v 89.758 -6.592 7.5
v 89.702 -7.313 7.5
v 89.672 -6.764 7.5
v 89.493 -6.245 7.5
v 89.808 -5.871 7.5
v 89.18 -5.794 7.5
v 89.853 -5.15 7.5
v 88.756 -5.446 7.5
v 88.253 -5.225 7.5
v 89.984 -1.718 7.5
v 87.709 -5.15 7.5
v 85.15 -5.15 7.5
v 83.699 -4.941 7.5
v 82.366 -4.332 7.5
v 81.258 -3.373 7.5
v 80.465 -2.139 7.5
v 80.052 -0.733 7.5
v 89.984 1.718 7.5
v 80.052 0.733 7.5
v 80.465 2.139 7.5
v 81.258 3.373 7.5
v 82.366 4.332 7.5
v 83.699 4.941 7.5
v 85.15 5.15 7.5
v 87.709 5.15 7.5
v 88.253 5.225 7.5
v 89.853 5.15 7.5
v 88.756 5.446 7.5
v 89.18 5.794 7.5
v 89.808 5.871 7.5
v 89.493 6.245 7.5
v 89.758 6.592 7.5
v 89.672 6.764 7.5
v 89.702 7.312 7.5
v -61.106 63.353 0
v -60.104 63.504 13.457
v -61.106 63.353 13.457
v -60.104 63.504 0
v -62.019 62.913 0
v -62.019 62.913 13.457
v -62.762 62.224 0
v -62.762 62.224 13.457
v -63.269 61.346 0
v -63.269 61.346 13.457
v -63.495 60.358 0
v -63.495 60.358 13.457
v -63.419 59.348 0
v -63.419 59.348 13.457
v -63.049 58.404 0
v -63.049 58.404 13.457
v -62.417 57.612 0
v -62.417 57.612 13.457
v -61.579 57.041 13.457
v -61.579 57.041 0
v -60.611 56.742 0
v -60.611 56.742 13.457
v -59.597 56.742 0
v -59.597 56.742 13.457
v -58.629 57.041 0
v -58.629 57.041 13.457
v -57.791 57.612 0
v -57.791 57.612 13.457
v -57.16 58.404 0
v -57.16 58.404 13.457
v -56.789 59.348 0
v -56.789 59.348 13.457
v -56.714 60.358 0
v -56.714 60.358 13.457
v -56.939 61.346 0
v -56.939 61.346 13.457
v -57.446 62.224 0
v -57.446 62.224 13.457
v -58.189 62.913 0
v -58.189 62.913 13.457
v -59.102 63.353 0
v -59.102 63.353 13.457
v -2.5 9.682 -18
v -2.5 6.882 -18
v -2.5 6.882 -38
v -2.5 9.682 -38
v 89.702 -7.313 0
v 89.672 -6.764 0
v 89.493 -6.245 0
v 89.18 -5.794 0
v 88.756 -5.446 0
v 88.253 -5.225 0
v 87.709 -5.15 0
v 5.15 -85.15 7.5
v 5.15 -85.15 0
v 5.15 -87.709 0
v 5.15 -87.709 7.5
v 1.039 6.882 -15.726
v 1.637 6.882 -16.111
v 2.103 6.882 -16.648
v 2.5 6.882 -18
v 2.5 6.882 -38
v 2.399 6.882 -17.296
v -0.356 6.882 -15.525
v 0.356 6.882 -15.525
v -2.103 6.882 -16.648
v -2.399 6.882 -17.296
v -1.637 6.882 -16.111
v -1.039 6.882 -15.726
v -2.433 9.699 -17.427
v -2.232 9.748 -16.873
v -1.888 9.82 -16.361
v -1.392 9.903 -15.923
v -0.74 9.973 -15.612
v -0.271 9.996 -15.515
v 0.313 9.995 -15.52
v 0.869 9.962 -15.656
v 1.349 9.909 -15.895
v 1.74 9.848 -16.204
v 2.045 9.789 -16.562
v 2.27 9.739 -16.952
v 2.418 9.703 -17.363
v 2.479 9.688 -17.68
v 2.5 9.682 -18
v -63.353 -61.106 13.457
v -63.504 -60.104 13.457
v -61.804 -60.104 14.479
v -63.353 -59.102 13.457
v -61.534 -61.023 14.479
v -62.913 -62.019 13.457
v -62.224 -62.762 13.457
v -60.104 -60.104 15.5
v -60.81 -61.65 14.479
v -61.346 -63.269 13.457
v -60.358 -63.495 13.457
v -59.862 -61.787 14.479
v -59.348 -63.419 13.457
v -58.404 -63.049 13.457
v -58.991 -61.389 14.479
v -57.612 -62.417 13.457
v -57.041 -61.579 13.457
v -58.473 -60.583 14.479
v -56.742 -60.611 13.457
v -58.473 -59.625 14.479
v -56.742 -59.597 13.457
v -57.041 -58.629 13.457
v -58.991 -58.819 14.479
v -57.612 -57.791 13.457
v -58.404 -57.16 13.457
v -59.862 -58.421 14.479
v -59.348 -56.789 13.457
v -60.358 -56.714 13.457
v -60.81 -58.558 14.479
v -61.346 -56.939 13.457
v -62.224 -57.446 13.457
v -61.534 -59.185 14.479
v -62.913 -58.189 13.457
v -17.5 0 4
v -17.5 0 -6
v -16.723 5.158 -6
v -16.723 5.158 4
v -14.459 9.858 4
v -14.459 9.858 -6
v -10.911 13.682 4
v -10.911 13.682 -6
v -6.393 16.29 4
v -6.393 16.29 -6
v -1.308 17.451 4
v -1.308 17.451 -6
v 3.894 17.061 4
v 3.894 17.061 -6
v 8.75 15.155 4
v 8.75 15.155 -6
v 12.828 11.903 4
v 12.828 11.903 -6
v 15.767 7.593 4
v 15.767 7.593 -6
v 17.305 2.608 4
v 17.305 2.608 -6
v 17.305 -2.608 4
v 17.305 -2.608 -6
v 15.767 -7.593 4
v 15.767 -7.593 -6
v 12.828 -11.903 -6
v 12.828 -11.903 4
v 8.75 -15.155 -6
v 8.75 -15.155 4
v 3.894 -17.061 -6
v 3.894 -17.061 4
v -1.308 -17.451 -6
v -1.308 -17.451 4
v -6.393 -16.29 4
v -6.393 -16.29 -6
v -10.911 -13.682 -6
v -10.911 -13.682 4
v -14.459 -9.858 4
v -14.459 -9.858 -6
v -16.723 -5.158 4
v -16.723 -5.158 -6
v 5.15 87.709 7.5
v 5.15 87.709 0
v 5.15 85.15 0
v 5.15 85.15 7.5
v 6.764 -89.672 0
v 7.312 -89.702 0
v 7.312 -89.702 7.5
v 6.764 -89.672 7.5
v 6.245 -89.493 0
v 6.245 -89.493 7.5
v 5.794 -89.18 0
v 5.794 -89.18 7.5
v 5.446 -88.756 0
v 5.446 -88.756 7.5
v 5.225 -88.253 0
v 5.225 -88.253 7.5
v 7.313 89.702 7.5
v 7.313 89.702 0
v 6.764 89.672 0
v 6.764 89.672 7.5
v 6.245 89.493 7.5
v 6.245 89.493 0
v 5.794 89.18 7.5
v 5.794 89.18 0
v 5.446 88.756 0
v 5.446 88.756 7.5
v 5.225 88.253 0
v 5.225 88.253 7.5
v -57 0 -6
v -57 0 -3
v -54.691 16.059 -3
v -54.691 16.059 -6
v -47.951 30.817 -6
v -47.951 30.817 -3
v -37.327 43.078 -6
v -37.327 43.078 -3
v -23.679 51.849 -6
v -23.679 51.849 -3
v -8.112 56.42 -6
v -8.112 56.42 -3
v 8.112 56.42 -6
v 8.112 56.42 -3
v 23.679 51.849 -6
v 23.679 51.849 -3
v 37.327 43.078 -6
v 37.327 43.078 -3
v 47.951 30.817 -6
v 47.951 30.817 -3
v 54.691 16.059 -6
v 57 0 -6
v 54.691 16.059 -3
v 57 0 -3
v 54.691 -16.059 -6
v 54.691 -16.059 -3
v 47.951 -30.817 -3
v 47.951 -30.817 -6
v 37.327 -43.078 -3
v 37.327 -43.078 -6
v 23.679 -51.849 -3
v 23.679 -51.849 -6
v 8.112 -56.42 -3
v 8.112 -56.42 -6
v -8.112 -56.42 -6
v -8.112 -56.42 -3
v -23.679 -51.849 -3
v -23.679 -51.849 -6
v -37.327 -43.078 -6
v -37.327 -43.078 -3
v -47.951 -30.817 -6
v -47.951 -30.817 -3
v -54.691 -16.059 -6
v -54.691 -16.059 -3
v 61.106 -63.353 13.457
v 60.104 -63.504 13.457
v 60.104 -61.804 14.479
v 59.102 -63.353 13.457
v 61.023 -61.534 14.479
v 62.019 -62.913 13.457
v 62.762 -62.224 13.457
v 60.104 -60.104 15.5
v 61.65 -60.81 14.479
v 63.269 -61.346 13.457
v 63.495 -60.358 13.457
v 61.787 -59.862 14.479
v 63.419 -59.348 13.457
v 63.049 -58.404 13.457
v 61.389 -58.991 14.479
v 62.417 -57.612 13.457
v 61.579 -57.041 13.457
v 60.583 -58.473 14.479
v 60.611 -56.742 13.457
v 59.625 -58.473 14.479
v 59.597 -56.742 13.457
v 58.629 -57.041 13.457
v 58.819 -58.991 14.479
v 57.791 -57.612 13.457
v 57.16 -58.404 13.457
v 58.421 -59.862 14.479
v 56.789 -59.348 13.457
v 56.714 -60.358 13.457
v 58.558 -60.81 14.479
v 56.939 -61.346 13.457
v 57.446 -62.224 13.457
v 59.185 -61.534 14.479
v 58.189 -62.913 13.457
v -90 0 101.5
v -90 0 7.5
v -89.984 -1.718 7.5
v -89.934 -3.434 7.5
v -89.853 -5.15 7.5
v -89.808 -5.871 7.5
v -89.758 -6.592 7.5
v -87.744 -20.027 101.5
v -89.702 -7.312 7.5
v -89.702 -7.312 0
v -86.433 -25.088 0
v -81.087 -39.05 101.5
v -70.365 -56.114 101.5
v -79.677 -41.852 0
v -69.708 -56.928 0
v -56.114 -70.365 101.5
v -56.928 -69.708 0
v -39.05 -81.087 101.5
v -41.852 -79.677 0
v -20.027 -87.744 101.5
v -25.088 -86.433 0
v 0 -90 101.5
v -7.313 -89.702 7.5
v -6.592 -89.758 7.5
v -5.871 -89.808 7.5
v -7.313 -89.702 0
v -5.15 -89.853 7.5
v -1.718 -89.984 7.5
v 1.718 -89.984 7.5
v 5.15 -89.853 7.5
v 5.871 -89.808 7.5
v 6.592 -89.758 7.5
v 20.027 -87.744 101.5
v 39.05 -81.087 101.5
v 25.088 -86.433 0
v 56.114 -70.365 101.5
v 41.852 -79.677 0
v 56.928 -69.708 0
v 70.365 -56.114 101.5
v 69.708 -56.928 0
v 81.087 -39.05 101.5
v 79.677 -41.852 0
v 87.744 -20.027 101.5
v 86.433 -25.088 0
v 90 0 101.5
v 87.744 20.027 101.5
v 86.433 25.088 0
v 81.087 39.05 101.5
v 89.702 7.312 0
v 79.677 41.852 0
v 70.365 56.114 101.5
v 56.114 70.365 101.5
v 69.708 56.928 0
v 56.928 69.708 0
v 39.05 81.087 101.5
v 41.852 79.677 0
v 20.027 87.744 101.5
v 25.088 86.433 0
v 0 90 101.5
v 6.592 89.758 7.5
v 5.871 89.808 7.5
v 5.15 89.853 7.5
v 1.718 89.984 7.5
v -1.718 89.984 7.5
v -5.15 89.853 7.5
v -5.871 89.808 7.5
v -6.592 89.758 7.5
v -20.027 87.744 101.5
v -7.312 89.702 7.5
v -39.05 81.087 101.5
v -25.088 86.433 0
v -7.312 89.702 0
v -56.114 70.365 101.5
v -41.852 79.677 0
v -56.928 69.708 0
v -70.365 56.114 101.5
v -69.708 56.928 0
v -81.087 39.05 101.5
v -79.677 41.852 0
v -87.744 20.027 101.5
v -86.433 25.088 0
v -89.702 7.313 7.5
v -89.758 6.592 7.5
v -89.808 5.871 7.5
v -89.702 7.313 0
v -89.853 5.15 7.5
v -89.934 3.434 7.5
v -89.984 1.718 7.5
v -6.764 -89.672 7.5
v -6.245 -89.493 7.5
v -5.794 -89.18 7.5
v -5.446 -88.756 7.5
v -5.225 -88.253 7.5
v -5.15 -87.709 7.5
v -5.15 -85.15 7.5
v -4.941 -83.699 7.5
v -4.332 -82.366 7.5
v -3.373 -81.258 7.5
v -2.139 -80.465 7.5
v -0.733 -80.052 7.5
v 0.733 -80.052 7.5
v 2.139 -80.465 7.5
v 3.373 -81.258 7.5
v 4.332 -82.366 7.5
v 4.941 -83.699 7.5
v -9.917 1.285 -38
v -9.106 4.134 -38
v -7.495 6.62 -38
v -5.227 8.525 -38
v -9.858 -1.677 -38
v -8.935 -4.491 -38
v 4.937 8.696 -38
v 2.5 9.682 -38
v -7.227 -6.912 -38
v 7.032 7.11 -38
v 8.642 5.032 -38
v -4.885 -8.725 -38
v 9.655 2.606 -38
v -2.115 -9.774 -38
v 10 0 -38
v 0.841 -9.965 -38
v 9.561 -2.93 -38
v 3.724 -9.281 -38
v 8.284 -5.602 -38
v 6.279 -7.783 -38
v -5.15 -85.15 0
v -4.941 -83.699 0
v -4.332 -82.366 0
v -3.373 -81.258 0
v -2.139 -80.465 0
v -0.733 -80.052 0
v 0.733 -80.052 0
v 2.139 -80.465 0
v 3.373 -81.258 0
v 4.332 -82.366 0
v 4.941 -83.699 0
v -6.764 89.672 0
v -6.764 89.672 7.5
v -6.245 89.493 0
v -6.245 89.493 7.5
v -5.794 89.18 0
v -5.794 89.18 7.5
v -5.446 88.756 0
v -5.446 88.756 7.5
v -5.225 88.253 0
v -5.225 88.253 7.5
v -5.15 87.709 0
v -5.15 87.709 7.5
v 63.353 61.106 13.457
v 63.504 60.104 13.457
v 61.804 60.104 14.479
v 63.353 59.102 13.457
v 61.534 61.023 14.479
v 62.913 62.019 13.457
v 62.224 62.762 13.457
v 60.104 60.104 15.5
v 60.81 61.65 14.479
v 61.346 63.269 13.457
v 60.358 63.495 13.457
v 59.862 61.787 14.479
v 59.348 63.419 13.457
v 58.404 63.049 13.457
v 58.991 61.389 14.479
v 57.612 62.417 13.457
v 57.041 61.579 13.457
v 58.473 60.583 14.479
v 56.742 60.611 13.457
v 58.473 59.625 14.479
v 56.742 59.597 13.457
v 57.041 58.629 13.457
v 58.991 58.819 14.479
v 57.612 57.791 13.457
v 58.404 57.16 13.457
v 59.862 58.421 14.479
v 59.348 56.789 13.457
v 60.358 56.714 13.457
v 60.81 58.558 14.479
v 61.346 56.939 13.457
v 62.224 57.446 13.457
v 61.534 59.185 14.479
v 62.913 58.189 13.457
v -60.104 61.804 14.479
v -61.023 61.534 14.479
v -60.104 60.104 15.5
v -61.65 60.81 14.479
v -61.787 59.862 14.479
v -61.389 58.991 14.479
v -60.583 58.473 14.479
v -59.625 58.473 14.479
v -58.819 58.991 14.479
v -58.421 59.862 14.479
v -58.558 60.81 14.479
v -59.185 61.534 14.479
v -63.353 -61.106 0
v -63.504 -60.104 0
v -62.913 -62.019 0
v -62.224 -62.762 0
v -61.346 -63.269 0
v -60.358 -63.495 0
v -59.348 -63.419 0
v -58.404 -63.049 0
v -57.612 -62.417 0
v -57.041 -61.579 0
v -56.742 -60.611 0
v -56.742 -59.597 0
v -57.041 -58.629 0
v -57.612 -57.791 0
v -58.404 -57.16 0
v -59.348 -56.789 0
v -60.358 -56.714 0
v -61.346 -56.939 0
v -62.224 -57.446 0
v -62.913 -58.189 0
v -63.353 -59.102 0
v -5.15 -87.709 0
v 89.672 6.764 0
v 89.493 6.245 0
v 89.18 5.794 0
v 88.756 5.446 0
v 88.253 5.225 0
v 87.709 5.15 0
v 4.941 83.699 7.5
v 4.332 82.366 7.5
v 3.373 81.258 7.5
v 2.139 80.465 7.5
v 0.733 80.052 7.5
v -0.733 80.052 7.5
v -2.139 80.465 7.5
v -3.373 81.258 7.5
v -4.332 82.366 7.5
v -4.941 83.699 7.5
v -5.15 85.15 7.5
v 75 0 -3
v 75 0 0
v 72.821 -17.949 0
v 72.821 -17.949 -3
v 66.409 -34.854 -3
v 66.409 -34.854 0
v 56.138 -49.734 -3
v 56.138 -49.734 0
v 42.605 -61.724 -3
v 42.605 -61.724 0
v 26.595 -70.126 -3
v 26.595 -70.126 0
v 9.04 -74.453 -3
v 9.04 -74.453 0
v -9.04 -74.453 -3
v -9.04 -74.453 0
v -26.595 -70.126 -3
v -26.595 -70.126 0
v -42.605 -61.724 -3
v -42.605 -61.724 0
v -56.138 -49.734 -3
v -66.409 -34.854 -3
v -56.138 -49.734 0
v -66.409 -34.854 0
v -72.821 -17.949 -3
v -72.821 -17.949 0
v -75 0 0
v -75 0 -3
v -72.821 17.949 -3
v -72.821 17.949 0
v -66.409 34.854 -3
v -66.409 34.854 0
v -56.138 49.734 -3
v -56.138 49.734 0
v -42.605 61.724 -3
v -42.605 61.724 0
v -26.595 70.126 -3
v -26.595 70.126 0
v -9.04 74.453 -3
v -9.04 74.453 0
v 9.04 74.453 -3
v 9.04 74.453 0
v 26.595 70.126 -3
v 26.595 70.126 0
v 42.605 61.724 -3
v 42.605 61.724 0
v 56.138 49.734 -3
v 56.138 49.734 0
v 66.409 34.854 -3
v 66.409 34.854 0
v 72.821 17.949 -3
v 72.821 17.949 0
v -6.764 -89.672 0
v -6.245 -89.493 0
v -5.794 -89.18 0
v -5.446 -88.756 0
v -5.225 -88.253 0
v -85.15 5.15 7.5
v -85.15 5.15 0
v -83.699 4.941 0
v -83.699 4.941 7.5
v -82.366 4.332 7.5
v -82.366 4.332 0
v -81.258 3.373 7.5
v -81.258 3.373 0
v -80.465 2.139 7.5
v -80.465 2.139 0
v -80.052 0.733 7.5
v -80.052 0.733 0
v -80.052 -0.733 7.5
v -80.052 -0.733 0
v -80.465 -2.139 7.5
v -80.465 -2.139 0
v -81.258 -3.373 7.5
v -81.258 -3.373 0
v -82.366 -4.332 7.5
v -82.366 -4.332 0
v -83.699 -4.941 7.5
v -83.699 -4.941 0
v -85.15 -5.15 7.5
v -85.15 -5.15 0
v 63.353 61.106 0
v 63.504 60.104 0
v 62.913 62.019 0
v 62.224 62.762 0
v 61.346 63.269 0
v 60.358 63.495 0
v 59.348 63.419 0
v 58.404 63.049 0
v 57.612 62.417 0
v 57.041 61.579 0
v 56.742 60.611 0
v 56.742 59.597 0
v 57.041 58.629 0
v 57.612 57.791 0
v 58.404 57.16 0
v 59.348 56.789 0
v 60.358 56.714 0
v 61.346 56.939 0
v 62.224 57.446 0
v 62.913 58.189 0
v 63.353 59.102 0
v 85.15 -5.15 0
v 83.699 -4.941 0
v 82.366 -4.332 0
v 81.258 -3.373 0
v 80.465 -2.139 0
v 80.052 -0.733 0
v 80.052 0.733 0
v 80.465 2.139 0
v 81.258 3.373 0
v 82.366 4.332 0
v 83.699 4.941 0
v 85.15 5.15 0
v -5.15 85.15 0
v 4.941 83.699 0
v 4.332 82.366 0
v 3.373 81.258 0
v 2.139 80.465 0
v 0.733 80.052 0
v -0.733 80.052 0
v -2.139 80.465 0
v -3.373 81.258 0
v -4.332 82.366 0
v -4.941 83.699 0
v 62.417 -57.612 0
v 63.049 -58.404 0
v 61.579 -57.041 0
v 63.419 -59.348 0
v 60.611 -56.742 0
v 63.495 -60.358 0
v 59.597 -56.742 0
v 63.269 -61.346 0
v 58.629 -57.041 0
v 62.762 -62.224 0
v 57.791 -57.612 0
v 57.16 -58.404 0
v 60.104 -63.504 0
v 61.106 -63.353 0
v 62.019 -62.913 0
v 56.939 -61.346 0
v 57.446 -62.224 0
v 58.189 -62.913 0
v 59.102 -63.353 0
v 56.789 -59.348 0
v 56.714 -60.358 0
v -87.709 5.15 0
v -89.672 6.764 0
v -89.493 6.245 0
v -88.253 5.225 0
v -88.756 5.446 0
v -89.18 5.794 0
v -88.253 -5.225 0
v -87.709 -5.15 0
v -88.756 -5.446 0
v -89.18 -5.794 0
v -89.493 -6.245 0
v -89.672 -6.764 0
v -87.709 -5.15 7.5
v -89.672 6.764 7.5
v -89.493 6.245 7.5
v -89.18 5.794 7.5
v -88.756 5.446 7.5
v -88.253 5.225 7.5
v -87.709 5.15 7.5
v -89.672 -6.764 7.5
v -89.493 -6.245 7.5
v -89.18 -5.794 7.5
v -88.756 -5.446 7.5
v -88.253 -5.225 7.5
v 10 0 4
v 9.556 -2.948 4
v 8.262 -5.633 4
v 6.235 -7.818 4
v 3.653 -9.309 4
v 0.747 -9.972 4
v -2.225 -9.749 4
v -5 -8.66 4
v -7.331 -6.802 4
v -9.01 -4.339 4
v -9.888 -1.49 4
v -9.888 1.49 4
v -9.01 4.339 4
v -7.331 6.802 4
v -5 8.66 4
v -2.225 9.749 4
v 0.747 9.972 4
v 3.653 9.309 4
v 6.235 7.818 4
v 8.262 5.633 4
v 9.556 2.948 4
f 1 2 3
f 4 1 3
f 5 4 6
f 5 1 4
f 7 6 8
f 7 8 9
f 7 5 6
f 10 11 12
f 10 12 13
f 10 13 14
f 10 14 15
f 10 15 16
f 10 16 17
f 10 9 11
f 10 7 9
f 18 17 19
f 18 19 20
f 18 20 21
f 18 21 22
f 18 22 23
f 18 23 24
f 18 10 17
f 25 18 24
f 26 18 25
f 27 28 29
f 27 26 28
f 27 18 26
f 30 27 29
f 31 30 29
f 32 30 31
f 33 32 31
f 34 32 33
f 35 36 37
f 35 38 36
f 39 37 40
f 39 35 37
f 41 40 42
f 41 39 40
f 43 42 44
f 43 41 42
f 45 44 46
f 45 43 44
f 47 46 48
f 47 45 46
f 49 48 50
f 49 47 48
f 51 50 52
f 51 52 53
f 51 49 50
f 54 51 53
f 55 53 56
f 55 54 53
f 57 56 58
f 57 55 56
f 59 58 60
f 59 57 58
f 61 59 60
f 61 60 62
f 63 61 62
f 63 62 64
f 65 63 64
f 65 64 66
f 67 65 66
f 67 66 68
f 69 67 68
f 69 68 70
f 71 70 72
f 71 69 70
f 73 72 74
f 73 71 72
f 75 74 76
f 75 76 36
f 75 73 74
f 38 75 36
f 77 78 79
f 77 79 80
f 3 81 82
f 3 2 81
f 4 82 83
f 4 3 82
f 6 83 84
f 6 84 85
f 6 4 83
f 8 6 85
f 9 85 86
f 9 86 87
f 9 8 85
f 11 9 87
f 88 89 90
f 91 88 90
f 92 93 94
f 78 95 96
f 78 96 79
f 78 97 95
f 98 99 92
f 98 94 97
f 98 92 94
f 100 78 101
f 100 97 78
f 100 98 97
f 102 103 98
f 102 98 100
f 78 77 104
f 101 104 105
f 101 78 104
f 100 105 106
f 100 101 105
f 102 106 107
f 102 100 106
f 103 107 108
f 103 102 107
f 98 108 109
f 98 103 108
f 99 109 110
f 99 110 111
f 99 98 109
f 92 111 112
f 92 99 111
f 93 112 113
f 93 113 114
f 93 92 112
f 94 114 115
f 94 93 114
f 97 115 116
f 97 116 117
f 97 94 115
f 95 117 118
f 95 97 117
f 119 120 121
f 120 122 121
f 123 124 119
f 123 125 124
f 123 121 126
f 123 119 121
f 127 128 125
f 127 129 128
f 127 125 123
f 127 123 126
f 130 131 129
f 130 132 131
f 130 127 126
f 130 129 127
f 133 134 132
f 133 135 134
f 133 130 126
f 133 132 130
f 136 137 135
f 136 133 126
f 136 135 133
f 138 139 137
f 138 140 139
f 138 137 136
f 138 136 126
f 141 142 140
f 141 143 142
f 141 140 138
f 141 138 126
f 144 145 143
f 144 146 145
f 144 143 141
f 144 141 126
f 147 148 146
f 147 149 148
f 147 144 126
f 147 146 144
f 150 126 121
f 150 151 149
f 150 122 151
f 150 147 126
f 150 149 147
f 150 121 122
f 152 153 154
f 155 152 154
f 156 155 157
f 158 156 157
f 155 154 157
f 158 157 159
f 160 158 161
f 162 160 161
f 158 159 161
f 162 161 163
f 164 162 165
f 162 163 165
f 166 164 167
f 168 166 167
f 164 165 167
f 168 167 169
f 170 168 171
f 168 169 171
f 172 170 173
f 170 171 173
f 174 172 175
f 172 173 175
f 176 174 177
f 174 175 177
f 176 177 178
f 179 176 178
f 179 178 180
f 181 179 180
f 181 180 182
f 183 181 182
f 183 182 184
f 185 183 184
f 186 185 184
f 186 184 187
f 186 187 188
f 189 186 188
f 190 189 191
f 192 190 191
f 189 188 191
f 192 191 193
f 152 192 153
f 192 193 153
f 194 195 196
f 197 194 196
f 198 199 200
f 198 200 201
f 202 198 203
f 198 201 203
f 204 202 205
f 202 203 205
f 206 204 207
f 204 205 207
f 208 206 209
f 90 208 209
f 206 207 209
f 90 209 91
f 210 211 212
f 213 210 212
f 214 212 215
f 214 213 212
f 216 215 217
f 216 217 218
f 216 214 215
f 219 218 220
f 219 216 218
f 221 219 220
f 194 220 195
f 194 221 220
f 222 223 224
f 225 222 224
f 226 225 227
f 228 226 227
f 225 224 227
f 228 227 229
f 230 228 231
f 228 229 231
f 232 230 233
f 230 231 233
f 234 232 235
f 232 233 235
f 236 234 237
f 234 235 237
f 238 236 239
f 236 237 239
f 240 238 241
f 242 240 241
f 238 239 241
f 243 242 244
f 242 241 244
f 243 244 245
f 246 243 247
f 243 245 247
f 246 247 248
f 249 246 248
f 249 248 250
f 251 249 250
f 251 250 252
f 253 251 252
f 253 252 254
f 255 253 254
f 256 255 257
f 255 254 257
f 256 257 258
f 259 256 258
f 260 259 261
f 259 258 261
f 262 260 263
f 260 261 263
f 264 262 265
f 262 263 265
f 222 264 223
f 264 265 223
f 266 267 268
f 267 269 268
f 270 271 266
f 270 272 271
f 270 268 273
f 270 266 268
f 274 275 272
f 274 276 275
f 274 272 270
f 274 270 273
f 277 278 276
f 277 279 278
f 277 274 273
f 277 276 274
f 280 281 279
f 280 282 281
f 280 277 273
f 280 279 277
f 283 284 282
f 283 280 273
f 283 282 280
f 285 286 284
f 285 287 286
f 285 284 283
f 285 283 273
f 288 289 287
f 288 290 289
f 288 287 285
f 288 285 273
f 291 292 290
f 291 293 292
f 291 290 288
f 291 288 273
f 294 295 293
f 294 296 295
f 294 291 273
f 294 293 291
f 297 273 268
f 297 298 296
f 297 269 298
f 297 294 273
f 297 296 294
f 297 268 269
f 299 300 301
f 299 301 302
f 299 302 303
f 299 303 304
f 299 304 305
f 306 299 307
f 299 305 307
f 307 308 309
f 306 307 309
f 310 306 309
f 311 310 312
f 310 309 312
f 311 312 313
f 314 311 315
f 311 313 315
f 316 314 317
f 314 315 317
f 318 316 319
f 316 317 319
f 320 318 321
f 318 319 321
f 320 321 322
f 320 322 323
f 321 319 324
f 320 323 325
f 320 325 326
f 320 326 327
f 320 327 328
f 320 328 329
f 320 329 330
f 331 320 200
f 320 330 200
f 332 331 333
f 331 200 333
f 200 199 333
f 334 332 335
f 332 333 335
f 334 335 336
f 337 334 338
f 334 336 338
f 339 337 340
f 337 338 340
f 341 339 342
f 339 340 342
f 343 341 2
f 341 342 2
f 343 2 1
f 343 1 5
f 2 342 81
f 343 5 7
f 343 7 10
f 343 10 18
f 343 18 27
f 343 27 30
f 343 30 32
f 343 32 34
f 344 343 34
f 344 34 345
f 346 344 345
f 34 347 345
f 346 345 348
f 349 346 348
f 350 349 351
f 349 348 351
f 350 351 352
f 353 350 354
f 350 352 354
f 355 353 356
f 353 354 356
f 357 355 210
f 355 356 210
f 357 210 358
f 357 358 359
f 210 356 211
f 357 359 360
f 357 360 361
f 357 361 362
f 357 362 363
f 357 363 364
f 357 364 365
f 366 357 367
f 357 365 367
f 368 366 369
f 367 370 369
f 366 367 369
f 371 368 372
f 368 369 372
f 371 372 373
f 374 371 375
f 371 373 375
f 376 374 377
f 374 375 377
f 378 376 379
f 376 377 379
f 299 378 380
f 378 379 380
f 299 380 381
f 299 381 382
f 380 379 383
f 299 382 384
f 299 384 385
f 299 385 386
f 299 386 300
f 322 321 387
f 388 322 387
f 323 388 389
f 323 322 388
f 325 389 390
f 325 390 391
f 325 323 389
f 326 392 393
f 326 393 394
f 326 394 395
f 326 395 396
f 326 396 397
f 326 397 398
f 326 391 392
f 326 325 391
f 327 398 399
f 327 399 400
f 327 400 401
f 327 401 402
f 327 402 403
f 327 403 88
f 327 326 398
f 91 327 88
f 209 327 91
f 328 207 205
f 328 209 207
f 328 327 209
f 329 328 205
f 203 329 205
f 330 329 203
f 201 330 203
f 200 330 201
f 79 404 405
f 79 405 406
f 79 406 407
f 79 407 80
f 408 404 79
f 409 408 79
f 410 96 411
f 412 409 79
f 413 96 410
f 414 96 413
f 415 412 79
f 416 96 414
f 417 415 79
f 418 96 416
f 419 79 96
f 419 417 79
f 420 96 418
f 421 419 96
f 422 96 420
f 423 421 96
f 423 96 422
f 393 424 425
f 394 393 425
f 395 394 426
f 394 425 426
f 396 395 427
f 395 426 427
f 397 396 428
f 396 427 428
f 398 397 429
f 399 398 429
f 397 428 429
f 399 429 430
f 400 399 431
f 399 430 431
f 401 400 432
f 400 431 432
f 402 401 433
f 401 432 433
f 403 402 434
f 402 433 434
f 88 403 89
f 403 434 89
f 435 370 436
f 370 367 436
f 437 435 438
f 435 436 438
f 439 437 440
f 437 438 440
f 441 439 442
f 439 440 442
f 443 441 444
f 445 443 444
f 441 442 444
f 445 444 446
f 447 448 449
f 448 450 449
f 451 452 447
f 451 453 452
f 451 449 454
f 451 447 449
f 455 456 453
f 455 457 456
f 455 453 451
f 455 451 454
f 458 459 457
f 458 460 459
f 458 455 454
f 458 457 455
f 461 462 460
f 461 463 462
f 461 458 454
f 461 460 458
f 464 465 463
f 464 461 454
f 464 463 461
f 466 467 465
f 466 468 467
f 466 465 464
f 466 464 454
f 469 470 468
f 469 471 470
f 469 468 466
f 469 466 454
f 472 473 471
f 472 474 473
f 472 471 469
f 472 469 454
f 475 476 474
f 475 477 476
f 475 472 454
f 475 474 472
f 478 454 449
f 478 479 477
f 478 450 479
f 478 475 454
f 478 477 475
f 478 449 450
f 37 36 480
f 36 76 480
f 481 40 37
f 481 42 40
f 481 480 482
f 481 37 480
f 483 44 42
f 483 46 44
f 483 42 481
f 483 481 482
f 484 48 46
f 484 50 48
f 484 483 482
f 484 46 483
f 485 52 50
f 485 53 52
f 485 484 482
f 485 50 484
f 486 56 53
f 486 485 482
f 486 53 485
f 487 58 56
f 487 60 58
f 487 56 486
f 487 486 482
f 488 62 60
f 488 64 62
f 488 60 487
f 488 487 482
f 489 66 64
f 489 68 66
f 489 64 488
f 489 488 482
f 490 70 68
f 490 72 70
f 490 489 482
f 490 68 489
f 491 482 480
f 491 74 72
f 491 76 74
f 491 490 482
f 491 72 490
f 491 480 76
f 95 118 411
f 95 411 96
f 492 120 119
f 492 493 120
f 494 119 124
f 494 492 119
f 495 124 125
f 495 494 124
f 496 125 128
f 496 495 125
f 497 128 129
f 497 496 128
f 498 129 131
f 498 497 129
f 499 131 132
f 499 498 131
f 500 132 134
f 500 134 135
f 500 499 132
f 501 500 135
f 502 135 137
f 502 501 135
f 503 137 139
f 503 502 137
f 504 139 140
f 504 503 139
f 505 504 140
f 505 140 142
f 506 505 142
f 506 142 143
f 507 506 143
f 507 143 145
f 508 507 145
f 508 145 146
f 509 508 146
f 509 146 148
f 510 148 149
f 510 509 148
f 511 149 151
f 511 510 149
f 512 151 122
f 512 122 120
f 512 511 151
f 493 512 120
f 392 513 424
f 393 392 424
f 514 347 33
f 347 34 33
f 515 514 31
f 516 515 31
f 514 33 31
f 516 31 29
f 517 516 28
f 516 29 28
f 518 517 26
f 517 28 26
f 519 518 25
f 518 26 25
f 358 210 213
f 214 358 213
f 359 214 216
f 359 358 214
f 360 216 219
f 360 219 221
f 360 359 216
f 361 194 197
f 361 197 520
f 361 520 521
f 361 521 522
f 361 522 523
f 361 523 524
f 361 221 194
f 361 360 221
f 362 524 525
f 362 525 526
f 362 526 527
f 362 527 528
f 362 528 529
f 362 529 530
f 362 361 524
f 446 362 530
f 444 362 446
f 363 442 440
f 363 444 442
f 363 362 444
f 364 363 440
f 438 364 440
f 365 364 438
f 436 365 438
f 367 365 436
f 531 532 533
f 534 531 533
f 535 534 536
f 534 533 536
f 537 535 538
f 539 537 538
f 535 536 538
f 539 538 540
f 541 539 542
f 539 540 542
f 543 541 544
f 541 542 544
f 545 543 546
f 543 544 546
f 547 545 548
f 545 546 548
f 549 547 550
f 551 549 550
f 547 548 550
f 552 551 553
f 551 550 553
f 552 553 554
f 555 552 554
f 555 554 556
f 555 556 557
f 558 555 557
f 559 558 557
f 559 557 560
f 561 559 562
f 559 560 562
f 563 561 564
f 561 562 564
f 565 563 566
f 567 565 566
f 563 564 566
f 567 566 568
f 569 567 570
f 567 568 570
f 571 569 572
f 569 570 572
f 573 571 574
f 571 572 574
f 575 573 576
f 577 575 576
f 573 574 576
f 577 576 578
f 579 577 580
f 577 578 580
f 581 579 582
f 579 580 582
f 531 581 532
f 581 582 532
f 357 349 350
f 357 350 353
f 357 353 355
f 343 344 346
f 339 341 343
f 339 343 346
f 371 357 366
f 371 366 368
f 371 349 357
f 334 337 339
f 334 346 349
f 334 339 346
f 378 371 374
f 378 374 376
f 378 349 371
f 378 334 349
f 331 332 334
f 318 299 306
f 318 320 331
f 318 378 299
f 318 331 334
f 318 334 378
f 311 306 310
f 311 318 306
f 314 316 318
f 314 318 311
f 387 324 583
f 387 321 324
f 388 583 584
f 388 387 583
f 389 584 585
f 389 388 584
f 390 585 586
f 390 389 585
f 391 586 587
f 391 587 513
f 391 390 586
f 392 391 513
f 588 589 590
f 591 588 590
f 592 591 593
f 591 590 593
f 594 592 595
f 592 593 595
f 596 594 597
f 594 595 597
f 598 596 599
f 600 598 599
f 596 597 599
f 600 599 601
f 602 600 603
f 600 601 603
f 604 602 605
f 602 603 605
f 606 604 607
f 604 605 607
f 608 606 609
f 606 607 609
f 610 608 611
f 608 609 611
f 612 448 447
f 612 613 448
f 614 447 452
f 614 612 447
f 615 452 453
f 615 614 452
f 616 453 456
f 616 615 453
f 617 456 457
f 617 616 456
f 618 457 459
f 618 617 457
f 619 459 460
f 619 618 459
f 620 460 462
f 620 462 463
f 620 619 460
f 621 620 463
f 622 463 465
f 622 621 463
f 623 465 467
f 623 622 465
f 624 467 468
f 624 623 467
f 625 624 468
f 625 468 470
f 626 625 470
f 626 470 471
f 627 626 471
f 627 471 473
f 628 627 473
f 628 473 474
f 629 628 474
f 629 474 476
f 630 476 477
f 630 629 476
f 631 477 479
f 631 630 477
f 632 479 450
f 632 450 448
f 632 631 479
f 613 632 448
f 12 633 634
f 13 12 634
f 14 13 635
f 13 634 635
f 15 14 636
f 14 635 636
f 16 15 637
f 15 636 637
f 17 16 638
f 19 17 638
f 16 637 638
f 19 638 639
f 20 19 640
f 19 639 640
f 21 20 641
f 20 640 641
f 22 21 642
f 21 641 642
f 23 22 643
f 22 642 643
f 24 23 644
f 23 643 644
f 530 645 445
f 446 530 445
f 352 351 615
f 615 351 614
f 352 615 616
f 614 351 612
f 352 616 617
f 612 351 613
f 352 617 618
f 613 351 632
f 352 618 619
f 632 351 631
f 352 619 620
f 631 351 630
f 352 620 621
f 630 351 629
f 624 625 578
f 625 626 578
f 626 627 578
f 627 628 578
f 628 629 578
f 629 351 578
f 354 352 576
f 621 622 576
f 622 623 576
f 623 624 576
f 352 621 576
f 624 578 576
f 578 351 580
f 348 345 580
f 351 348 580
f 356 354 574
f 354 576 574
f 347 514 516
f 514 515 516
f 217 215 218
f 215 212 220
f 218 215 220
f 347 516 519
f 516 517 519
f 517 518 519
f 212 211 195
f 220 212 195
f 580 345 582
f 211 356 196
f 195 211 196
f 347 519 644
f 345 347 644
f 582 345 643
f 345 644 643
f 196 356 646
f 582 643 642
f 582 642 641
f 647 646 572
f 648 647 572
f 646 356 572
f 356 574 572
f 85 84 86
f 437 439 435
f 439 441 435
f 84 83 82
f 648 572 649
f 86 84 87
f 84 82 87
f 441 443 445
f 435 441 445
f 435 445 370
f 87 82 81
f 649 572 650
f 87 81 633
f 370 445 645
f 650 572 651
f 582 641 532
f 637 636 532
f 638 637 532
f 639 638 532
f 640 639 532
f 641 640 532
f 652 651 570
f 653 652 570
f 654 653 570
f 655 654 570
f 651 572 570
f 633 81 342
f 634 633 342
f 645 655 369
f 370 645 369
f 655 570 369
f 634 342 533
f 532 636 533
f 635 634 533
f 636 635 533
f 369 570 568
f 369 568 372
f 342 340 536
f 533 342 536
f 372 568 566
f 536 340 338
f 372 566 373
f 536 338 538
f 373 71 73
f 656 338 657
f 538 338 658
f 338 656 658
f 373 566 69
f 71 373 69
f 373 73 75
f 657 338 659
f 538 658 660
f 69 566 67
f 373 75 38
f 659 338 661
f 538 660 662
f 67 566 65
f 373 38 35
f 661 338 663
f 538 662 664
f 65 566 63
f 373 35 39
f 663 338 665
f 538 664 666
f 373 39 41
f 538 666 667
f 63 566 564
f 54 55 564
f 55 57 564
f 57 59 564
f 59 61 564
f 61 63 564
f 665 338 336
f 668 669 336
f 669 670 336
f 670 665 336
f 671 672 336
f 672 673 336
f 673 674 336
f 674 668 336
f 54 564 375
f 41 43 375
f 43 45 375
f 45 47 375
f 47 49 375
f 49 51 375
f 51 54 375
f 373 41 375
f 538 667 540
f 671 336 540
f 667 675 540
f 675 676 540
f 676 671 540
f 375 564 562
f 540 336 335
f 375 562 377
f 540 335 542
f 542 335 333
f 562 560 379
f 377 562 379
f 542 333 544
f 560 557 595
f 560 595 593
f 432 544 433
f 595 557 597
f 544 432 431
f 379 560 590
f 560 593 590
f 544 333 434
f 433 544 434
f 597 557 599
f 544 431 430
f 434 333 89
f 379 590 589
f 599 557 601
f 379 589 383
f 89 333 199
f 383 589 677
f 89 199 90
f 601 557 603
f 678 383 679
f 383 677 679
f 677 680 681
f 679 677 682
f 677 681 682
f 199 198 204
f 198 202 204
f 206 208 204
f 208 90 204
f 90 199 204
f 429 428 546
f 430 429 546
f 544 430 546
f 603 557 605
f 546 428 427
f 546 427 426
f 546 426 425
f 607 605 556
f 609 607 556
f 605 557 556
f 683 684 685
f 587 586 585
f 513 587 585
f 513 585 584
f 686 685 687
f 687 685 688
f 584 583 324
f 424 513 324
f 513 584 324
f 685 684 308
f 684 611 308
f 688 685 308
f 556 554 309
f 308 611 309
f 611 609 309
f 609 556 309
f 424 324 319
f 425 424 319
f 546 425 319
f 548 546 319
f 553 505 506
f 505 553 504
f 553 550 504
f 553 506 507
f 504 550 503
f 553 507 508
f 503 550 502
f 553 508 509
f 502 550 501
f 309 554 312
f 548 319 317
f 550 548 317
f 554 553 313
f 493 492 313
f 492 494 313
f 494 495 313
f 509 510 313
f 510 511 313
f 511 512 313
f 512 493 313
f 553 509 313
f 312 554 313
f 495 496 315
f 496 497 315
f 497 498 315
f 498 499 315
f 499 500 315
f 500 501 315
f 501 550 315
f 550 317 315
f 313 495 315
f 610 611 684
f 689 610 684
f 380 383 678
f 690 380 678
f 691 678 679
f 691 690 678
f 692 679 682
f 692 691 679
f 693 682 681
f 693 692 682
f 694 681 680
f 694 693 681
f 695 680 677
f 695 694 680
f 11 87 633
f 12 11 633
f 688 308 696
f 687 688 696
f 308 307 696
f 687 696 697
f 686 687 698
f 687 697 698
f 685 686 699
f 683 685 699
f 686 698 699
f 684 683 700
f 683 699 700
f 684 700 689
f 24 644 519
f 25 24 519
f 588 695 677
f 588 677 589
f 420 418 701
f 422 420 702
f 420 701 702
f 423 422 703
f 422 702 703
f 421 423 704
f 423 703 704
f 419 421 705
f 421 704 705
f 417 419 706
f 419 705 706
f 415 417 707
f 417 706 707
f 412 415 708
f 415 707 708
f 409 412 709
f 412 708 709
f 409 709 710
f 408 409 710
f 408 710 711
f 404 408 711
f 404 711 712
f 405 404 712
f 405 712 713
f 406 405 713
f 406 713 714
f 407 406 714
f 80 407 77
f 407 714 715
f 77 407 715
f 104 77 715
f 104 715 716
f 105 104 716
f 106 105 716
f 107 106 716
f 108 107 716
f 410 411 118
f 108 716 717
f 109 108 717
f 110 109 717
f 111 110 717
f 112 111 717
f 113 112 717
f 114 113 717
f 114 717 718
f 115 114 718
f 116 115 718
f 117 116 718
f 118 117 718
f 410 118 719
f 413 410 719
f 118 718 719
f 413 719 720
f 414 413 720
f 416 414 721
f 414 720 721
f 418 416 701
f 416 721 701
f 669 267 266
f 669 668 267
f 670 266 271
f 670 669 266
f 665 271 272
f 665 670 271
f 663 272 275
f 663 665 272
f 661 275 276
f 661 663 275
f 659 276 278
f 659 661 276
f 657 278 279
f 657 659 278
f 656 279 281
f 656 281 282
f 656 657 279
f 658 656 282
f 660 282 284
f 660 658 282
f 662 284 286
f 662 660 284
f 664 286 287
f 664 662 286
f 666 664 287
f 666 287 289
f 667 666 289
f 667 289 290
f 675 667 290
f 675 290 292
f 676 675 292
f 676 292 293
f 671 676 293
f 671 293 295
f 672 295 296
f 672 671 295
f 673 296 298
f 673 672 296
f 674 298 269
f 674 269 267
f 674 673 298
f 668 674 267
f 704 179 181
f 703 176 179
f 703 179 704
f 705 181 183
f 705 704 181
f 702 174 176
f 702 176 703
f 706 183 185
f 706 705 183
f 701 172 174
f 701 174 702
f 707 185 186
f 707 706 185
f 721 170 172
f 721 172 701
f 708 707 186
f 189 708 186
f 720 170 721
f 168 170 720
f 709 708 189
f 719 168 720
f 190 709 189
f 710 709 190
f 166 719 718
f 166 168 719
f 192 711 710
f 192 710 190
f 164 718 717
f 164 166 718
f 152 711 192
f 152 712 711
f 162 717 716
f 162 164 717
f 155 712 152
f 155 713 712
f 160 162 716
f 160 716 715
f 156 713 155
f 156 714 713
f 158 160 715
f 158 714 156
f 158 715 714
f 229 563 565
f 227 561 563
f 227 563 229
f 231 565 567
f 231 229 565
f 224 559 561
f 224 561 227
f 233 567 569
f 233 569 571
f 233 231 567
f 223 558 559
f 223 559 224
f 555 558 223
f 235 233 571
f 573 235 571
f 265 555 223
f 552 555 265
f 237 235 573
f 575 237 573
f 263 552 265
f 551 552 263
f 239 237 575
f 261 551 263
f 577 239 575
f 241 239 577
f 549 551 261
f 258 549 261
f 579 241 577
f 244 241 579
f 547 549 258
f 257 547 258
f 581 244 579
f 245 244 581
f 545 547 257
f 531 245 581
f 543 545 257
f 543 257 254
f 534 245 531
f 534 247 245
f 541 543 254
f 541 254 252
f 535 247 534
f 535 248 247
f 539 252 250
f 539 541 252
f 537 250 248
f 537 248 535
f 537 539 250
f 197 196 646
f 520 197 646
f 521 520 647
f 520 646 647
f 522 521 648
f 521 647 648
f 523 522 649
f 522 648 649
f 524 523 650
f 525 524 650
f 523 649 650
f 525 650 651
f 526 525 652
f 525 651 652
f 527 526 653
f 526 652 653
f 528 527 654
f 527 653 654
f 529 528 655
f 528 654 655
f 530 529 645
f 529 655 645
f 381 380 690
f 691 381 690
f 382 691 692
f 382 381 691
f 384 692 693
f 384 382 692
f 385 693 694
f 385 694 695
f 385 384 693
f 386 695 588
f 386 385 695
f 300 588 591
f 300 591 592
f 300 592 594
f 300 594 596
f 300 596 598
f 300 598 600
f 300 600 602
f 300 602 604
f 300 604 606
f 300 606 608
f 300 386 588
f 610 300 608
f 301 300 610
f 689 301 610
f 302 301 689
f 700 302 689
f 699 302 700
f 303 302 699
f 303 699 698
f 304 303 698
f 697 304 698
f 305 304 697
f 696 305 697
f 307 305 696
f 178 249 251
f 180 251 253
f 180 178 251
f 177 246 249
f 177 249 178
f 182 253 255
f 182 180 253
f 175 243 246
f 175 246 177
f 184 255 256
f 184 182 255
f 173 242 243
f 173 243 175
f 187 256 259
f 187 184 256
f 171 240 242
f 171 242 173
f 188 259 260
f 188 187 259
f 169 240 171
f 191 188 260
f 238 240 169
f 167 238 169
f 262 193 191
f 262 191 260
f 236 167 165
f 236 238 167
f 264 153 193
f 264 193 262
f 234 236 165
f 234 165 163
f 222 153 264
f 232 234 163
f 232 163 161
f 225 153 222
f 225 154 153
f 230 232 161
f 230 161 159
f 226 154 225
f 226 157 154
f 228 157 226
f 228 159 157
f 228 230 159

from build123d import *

# Parameters (mm, degrees)
SKETCH1_R                = 90
BOSS_EXTRUDE1_DEPTH      = 101.5
CUT_EXTRUDE1_DEPTH       = 7.5
FILLET1_R                = 2
CIRPATTERN1_COUNT        = 4
FILLET1_OF_CIRPATTERN1_R = 2
SKETCH6_R                = 75
BOSS_EXTRUDE2_DEPTH      = 3
SKETCH7_R                = 57
BOSS_EXTRUDE3_DEPTH      = 3
SKETCH8_R                = 17.5
CUT_EXTRUDE2_DEPTH       = 10
SKETCH9_R                = 10
BOSS_EXTRUDE4_DEPTH      = 42
CUT_EXTRUDE3_START       = -20
CUT_EXTRUDE3_DEPTH       = 20
CUT_EXTRUDE4_DEPTH       = 167.698712469


with BuildPart() as part:
    # Sketch1 → Boss-Extrude1 (new body)
    with BuildSketch(Plane.XY):
        with Locations(Location((0, 0, 0), (0, 0, 180))):
            Circle(SKETCH1_R)
    extrude(amount=BOSS_EXTRUDE1_DEPTH)

    # Sketch2 → Cut-Extrude1 (cut)
    with BuildSketch(Plane(origin=(0, 0, 0), x_dir=(-1, 0, 0), z_dir=(0, 0, -1))):
        with BuildLine():
            Line((-5.15, 89.852531962), (-5.15, 85.15))
            ThreePointArc((-5.15, 85.15), (0, 80), (5.15, 85.15))
            Line((5.15, 85.15), (5.15, 89.852531962))
            ThreePointArc((5.15, 89.852531962), (0, 90), (-5.15, 89.852531962))
        make_face()
    cut_extrude1 = extrude(amount=-CUT_EXTRUDE1_DEPTH, mode=Mode.SUBTRACT)

    # Fillet1
    fillet1_edges = [part.edges().sort_by_distance(p)[0] for p in [
        (-5.15, 89.852531962, 3.75),
        (5.15, 89.852531962, 3.75),
    ]]
    fillet(fillet1_edges, radius=FILLET1_R)

    # Sketch5 → Tap Drill for M8 Tap1 (revolve, cut)
    with BuildSketch(Plane(origin=(-60.104076401, 60.104076401, 0), x_dir=(0, 1, 0), z_dir=(1, 0, 0))):
        Polygon((0, 0), (0, 15.5), (3.4, 13.457073895), (3.4, 0), align=None)
    tap_drill_for_m8_tap1 = revolve(axis=Axis((-60.104076401, 60.104076401, -6.35), (0, 0, 1)), mode=Mode.SUBTRACT)

    # CirPattern1: Cut-Extrude1, Tap Drill for M8 Tap1 ×4 about axis
    cirpattern1_axis = Axis((0, 0, 0), (0, 0, 1))
    add([cut_extrude1.rotate(cirpattern1_axis, i * 360 / CIRPATTERN1_COUNT) for i in range(1, CIRPATTERN1_COUNT)], mode=Mode.SUBTRACT)
    add([tap_drill_for_m8_tap1.rotate(cirpattern1_axis, i * 360 / CIRPATTERN1_COUNT) for i in range(1, CIRPATTERN1_COUNT)], mode=Mode.SUBTRACT)

    # Fillet1 of CirPattern1
    fillet1_of_cirpattern1_edges = [part.edges().sort_by_distance(p)[0] for p in [
        (-89.852531962, -5.15, 3.75),
        (-89.852531962, 5.15, 3.75),
        (5.15, -89.852531962, 3.75),
        (-5.15, -89.852531962, 3.75),
        (89.852531962, 5.15, 3.75),
        (89.852531962, -5.15, 3.75),
    ]]
    fillet(fillet1_of_cirpattern1_edges, radius=FILLET1_OF_CIRPATTERN1_R)

    # Sketch6 → Boss-Extrude2 (add)
    with BuildSketch(Plane(origin=(0, 0, 0), x_dir=(-1, 0, 0), z_dir=(0, 0, -1))):
        with Locations(Location((0, 0, 0), (0, 0, 180))):
            Circle(SKETCH6_R)
    extrude(amount=BOSS_EXTRUDE2_DEPTH)

    # Sketch7 → Boss-Extrude3 (add)
    with BuildSketch(Plane(origin=(0, 0, -3), x_dir=(-1, 0, 0), z_dir=(0, 0, -1))):
        Circle(SKETCH7_R)
    extrude(amount=BOSS_EXTRUDE3_DEPTH)

    # Sketch8 → Cut-Extrude2 (cut)
    with BuildSketch(Plane(origin=(0, 0, -6), x_dir=(-1, 0, 0), z_dir=(0, 0, -1))):
        Circle(SKETCH8_R)
    extrude(amount=-CUT_EXTRUDE2_DEPTH, mode=Mode.SUBTRACT)

    # Sketch9 → Boss-Extrude4 (add)
    with BuildSketch(Plane(origin=(0, 0, 4), x_dir=(-1, 0, 0), z_dir=(0, 0, -1))):
        with Locations(Location((0, 0, 0), (0, 0, 180))):
            Circle(SKETCH9_R)
    extrude(amount=BOSS_EXTRUDE4_DEPTH)

    # Sketch10 → Cut-Extrude3 (cut)
    with BuildSketch(Plane(origin=(0, 0, -38), x_dir=(-1, 0, 0), z_dir=(0, 0, -1)).offset(CUT_EXTRUDE3_START)):
        with BuildLine():
            Line((-2.5, 9.682458366), (-2.5, 6.882458366))
            Line((-2.5, 6.882458366), (2.5, 6.882458366))
            Line((2.5, 6.882458366), (2.5, 9.682458366))
            ThreePointArc((2.5, 9.682458366), (0, 10), (-2.5, 9.682458366))
        make_face()
    extrude(amount=CUT_EXTRUDE3_DEPTH, mode=Mode.SUBTRACT)

    # Sketch11 → Cut-Extrude4 (cut, through all)
    with BuildSketch(Plane(origin=(0, 6.882458366, 0), x_dir=(1, 0, 0), z_dir=(0, 1, 0))):
        with BuildLine():
            Line((2.5, 18), (-2.5, 18))
            ThreePointArc((-2.5, 18), (0, 15.5), (2.5, 18))
        make_face()
    extrude(amount=CUT_EXTRUDE4_DEPTH, mode=Mode.SUBTRACT)


solid = part.part
